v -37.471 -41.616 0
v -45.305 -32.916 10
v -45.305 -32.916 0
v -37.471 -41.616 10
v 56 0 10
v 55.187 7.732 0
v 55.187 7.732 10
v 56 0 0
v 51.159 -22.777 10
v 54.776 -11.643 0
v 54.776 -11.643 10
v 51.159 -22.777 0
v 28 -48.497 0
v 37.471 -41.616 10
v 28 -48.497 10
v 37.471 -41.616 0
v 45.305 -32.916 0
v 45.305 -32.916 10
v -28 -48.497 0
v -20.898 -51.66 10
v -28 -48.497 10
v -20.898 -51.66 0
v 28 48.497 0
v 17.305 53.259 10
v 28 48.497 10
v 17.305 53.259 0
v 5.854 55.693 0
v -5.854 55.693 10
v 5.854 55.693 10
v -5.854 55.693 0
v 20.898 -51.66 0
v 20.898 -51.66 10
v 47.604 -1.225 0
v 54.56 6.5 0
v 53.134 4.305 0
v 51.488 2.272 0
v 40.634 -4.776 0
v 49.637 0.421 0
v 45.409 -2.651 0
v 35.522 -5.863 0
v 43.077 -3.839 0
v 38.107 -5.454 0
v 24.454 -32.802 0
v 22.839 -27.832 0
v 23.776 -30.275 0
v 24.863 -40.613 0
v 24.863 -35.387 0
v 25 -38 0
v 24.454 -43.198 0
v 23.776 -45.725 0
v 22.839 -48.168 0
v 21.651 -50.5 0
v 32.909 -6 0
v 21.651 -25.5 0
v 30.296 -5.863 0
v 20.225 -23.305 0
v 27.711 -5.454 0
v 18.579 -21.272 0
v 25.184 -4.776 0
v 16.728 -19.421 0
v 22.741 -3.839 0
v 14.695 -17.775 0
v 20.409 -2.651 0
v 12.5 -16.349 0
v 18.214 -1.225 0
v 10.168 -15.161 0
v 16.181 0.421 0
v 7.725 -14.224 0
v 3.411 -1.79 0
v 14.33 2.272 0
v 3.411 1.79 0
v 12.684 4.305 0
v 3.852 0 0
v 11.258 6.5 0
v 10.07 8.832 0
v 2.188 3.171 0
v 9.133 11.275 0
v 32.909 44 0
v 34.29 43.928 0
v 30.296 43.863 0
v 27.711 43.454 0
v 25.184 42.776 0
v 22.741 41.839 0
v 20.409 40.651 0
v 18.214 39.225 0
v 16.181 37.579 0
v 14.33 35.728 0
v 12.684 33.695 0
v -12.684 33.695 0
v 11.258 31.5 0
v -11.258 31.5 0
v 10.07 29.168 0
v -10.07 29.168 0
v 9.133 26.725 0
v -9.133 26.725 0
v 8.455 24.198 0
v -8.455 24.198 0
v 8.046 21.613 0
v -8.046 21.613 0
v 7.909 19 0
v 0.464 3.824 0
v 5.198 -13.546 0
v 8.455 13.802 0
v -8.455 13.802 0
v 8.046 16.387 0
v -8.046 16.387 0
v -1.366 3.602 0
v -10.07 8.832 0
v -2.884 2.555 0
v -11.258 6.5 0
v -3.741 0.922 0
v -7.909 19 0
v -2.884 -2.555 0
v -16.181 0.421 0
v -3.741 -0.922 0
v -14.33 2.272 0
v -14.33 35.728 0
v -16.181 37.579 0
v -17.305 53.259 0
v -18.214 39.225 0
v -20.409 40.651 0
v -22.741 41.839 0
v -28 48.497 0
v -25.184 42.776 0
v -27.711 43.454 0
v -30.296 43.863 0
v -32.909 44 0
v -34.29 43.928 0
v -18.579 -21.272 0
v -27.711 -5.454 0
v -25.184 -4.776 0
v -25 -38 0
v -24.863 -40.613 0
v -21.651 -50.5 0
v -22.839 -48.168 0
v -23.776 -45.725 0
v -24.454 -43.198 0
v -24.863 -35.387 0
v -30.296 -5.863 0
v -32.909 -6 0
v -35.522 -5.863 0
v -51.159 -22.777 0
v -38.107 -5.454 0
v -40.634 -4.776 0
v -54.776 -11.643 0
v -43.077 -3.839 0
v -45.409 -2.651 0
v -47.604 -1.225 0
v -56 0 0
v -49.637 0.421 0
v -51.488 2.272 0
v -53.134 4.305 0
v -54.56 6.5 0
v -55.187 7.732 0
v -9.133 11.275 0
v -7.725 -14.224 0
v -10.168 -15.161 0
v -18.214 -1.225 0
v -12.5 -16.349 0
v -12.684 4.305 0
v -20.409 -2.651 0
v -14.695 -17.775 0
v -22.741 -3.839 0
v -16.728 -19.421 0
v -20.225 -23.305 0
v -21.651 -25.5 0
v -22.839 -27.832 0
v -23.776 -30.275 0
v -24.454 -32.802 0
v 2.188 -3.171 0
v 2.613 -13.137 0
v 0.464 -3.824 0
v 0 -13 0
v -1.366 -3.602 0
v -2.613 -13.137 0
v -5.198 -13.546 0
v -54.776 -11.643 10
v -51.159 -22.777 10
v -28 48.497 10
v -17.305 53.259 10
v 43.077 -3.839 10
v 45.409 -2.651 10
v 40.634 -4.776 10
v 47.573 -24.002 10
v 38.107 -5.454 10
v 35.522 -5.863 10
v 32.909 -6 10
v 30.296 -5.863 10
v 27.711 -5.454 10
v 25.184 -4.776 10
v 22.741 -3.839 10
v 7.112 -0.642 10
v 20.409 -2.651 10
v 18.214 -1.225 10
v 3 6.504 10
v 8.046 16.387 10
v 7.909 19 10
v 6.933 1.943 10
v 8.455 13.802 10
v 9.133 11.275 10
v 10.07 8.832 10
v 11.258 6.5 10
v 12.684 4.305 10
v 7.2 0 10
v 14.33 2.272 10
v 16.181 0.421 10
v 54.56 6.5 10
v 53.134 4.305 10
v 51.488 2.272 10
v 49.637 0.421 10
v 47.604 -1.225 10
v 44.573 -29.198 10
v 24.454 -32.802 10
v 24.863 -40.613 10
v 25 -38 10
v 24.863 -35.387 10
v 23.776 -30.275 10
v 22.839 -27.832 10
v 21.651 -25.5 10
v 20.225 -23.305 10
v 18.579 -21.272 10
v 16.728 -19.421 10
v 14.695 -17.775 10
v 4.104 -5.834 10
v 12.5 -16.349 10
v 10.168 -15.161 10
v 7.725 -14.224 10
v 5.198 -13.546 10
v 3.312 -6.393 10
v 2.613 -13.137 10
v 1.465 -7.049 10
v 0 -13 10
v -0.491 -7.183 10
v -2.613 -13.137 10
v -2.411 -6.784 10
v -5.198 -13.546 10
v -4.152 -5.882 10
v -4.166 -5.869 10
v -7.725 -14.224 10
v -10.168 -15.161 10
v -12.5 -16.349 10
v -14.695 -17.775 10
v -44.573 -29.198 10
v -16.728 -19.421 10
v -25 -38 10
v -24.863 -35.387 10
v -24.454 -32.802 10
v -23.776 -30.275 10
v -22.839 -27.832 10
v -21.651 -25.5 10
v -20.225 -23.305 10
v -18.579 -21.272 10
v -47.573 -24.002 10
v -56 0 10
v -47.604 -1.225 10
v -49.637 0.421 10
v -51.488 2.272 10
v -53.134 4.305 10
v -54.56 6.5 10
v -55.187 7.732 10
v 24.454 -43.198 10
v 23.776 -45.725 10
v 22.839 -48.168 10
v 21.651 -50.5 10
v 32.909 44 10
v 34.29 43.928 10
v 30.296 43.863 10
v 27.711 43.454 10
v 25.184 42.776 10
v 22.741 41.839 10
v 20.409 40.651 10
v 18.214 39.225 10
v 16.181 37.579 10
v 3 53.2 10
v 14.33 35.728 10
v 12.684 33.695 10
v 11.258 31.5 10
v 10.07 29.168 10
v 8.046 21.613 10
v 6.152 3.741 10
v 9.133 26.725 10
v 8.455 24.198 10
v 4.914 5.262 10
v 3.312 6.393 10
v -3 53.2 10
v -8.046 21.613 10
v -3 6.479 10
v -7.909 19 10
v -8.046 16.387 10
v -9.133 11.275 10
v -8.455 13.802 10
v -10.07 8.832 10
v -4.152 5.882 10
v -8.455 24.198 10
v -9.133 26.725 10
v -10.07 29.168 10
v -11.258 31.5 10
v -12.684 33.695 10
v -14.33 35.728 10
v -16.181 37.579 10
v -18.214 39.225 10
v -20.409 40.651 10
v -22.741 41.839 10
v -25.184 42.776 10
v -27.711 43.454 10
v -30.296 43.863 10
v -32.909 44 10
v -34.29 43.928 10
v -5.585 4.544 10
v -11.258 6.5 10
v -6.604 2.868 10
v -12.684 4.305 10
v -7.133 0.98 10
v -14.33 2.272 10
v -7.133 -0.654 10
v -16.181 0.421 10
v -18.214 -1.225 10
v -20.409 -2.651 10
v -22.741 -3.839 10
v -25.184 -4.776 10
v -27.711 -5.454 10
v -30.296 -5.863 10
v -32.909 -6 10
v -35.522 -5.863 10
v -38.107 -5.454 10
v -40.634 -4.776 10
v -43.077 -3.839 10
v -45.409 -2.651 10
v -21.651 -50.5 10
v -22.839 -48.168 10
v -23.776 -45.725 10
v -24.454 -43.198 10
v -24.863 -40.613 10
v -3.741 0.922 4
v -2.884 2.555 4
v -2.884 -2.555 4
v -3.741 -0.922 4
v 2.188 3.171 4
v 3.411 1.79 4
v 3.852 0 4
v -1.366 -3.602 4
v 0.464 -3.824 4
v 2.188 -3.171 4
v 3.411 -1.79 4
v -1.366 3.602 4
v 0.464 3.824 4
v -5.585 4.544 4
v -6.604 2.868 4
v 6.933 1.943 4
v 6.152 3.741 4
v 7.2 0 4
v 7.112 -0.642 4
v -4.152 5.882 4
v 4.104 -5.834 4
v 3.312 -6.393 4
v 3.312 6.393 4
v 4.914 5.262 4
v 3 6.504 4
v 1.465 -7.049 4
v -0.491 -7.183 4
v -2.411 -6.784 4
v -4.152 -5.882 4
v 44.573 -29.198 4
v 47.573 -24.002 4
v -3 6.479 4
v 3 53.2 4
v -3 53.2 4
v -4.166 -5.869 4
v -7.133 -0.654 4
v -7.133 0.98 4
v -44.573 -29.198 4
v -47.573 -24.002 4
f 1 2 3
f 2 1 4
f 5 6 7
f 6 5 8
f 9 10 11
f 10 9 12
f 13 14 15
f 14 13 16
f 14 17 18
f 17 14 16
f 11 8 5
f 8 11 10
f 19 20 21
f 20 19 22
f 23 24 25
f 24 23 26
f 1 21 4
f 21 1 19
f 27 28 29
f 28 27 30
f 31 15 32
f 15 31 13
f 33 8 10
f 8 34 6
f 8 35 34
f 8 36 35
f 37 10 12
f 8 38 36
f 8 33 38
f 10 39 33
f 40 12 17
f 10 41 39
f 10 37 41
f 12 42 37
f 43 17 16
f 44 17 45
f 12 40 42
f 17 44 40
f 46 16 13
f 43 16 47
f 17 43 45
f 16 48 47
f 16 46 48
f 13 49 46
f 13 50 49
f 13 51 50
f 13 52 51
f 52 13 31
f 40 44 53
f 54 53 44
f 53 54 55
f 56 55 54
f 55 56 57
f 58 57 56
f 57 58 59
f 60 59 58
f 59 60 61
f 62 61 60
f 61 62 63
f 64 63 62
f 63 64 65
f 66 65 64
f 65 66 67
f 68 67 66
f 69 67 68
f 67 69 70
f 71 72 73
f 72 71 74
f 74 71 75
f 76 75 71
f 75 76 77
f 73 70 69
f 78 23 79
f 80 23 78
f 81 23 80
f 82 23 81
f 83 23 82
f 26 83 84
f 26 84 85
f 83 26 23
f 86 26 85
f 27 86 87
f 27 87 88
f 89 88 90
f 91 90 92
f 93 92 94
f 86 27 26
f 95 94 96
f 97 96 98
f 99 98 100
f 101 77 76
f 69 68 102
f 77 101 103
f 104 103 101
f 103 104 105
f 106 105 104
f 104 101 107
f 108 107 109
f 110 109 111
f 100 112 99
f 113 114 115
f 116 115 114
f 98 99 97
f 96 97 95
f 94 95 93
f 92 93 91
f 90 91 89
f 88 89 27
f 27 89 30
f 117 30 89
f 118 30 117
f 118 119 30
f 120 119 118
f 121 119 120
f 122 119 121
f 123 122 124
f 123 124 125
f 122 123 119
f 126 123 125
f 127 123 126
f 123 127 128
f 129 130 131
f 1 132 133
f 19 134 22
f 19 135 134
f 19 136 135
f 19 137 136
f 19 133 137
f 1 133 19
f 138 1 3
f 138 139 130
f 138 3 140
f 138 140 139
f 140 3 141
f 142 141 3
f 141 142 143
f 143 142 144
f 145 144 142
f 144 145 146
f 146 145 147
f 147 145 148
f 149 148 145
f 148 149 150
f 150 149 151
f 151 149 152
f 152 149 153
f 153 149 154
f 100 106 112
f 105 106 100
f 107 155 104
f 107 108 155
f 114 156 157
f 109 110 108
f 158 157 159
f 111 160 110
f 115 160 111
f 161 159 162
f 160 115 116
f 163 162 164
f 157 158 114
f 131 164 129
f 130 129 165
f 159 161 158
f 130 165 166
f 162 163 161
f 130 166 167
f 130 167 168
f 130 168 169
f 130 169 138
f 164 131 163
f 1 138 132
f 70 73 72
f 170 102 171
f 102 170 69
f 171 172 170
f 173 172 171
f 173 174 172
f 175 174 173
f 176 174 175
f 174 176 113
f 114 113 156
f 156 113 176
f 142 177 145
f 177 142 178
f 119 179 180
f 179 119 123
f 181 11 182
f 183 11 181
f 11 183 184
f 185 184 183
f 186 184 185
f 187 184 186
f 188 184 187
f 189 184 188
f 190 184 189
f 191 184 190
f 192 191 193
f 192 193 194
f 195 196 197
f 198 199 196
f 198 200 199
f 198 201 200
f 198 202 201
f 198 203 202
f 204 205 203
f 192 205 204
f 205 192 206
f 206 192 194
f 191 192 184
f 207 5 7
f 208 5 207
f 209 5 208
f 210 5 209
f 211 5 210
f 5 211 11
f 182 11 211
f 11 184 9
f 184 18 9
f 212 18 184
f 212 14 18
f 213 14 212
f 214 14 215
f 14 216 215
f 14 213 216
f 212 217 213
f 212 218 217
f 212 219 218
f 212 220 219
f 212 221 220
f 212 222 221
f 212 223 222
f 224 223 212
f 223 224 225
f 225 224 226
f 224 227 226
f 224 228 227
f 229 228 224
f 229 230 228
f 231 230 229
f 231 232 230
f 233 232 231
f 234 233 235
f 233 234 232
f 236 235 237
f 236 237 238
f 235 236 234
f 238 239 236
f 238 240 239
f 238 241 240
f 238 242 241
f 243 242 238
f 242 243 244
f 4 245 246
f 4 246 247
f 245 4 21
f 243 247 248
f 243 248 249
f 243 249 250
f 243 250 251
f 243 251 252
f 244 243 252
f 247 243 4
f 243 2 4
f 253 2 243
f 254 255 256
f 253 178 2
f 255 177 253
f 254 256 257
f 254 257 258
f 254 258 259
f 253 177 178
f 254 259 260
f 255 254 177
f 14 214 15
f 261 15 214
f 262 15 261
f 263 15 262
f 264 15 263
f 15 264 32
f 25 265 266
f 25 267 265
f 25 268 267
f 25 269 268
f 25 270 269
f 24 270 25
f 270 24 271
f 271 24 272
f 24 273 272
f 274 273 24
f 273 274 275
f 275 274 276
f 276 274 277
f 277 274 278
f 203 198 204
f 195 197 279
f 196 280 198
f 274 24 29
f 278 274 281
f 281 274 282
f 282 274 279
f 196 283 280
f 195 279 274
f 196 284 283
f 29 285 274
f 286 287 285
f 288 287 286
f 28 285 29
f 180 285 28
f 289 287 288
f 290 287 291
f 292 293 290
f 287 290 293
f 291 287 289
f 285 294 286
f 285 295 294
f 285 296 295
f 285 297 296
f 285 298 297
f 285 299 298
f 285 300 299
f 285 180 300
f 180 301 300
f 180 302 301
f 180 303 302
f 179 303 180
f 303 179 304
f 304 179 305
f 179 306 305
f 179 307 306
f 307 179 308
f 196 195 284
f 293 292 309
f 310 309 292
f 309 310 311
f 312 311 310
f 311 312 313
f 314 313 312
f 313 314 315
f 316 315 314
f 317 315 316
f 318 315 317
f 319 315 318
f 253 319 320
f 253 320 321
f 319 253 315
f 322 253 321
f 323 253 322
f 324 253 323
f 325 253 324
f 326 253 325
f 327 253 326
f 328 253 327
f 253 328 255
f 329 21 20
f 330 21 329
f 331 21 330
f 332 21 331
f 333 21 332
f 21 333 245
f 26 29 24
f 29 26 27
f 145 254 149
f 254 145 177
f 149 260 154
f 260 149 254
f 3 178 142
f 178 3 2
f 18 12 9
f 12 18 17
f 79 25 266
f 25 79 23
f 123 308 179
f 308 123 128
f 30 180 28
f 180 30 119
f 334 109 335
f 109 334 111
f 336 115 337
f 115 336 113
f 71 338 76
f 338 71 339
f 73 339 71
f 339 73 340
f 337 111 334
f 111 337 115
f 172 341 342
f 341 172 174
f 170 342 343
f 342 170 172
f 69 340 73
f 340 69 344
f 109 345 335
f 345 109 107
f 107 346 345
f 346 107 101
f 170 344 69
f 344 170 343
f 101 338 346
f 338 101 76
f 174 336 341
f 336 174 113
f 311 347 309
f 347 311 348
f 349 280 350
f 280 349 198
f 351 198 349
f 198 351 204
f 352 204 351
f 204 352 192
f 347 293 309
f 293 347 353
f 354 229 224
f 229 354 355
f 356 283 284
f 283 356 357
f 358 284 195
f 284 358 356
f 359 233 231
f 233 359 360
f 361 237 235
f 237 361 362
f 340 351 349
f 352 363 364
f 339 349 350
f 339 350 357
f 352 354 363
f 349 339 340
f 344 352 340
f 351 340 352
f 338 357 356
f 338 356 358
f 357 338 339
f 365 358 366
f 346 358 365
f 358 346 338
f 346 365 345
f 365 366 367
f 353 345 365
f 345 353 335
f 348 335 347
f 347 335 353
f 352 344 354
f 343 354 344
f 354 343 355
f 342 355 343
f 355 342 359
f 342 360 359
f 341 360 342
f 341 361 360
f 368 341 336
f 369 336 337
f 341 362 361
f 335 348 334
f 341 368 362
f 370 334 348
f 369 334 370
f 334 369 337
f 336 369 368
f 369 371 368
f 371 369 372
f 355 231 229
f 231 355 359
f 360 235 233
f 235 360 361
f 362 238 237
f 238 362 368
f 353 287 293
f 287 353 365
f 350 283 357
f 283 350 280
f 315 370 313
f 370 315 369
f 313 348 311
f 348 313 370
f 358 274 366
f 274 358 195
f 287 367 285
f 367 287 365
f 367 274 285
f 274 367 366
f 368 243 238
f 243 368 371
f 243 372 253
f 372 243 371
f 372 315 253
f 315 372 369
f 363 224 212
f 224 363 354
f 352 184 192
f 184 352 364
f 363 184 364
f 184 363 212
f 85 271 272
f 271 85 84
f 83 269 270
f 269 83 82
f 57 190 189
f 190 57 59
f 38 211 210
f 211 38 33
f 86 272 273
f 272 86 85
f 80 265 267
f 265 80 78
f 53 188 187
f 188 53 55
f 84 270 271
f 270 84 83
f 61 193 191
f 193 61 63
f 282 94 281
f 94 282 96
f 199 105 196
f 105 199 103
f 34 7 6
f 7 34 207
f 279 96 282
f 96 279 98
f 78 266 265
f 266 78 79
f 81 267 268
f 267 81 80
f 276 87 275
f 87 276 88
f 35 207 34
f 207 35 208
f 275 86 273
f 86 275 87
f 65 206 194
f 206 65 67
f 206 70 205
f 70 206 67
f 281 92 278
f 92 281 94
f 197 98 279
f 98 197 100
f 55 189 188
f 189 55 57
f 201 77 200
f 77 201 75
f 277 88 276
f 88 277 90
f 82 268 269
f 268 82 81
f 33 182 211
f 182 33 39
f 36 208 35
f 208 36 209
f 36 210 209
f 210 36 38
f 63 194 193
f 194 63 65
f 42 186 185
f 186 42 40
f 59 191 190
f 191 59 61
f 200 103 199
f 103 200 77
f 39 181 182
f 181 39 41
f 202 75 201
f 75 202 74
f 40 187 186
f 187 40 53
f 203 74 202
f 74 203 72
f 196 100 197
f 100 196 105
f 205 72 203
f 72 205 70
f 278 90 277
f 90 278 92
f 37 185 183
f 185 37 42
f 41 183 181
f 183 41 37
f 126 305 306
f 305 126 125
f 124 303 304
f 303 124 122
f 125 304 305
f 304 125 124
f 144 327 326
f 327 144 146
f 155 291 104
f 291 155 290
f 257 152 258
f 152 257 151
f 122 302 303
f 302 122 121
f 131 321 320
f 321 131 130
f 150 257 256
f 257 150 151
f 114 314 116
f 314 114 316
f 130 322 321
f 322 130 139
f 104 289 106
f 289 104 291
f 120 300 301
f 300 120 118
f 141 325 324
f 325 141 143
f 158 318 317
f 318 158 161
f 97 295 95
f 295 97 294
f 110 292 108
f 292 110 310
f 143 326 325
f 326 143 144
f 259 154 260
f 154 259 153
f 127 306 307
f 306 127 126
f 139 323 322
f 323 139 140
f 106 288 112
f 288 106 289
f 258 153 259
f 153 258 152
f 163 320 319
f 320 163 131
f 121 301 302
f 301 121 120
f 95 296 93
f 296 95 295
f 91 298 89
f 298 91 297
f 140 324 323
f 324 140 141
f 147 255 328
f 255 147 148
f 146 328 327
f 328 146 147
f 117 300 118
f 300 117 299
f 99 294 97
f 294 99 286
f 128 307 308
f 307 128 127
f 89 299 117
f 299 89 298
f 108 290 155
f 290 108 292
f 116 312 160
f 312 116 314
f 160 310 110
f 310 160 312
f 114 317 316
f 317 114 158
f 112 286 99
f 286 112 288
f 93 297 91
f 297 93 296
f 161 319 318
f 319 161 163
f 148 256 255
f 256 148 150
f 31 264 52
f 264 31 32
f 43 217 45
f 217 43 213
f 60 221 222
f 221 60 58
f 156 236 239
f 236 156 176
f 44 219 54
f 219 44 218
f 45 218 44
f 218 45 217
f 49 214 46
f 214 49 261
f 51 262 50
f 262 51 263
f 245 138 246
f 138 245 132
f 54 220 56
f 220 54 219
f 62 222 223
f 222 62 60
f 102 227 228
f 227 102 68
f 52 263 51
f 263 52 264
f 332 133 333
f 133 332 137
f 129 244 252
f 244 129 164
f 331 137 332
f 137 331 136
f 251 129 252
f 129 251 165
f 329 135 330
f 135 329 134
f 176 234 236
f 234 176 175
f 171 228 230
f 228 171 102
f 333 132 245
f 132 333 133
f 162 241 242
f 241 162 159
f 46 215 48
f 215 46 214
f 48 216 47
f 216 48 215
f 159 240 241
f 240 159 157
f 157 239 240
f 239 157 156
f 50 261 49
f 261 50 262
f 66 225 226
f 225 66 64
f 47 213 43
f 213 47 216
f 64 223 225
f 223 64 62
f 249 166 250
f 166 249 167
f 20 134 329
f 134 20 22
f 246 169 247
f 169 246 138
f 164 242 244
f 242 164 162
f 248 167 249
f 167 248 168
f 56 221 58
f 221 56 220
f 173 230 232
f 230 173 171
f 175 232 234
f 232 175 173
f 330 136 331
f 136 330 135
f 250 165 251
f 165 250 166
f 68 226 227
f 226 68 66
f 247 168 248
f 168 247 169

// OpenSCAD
shaft_insert_height = 4;
shaft_diameter = 12;

base_radius = 50+shaft_diameter/2;
base_height = 10;

shaft_insert_height = 4;
cruz_base_height = 10;
arm_height = cruz_base_height - shaft_insert_height;
a=0.95;
b=6.7;

 module cosito(){
     union(){
        rotate([0, 0, 0]) translate([0, base_radius*a/2, 0]) {cube([arm_height, base_radius*a, arm_height], center=true);}
        rotate([0, 0, 120]) translate([0, base_radius*a/2, 0]) {cube([arm_height, base_radius*a, arm_height], center=true);}
        rotate([0, 0, 240]) translate([0, base_radius*a/2, 0]) {cube([arm_height, base_radius*a, arm_height], center=true);}
        }
     }
 
 module base(){
     difference(){
         difference(){
             {cylinder(base_height, r=base_radius);}
             {cylinder(100, d=b*1.15);}
             translate([0, 0, 4]) {cylinder(base_height, d=shaft_diameter*1.2);}
           } 
         translate([0, 0, base_height-arm_height/2]) {cosito();}
         rotate([0, 0, 30]) translate([10+base_radius/2, 0, 0]) {cylinder(base_height, r=25, $fn=60);}
         rotate([0, 0, 120+30]) translate([10+base_radius/2, 0, 0]) {cylinder(base_height, r=25, $fn=60);}
         rotate([0, 0, 240+30]) translate([10+base_radius/2, 0, 0]) {cylinder(base_height, r=25, $fn=60);}
         }
     }
base();
